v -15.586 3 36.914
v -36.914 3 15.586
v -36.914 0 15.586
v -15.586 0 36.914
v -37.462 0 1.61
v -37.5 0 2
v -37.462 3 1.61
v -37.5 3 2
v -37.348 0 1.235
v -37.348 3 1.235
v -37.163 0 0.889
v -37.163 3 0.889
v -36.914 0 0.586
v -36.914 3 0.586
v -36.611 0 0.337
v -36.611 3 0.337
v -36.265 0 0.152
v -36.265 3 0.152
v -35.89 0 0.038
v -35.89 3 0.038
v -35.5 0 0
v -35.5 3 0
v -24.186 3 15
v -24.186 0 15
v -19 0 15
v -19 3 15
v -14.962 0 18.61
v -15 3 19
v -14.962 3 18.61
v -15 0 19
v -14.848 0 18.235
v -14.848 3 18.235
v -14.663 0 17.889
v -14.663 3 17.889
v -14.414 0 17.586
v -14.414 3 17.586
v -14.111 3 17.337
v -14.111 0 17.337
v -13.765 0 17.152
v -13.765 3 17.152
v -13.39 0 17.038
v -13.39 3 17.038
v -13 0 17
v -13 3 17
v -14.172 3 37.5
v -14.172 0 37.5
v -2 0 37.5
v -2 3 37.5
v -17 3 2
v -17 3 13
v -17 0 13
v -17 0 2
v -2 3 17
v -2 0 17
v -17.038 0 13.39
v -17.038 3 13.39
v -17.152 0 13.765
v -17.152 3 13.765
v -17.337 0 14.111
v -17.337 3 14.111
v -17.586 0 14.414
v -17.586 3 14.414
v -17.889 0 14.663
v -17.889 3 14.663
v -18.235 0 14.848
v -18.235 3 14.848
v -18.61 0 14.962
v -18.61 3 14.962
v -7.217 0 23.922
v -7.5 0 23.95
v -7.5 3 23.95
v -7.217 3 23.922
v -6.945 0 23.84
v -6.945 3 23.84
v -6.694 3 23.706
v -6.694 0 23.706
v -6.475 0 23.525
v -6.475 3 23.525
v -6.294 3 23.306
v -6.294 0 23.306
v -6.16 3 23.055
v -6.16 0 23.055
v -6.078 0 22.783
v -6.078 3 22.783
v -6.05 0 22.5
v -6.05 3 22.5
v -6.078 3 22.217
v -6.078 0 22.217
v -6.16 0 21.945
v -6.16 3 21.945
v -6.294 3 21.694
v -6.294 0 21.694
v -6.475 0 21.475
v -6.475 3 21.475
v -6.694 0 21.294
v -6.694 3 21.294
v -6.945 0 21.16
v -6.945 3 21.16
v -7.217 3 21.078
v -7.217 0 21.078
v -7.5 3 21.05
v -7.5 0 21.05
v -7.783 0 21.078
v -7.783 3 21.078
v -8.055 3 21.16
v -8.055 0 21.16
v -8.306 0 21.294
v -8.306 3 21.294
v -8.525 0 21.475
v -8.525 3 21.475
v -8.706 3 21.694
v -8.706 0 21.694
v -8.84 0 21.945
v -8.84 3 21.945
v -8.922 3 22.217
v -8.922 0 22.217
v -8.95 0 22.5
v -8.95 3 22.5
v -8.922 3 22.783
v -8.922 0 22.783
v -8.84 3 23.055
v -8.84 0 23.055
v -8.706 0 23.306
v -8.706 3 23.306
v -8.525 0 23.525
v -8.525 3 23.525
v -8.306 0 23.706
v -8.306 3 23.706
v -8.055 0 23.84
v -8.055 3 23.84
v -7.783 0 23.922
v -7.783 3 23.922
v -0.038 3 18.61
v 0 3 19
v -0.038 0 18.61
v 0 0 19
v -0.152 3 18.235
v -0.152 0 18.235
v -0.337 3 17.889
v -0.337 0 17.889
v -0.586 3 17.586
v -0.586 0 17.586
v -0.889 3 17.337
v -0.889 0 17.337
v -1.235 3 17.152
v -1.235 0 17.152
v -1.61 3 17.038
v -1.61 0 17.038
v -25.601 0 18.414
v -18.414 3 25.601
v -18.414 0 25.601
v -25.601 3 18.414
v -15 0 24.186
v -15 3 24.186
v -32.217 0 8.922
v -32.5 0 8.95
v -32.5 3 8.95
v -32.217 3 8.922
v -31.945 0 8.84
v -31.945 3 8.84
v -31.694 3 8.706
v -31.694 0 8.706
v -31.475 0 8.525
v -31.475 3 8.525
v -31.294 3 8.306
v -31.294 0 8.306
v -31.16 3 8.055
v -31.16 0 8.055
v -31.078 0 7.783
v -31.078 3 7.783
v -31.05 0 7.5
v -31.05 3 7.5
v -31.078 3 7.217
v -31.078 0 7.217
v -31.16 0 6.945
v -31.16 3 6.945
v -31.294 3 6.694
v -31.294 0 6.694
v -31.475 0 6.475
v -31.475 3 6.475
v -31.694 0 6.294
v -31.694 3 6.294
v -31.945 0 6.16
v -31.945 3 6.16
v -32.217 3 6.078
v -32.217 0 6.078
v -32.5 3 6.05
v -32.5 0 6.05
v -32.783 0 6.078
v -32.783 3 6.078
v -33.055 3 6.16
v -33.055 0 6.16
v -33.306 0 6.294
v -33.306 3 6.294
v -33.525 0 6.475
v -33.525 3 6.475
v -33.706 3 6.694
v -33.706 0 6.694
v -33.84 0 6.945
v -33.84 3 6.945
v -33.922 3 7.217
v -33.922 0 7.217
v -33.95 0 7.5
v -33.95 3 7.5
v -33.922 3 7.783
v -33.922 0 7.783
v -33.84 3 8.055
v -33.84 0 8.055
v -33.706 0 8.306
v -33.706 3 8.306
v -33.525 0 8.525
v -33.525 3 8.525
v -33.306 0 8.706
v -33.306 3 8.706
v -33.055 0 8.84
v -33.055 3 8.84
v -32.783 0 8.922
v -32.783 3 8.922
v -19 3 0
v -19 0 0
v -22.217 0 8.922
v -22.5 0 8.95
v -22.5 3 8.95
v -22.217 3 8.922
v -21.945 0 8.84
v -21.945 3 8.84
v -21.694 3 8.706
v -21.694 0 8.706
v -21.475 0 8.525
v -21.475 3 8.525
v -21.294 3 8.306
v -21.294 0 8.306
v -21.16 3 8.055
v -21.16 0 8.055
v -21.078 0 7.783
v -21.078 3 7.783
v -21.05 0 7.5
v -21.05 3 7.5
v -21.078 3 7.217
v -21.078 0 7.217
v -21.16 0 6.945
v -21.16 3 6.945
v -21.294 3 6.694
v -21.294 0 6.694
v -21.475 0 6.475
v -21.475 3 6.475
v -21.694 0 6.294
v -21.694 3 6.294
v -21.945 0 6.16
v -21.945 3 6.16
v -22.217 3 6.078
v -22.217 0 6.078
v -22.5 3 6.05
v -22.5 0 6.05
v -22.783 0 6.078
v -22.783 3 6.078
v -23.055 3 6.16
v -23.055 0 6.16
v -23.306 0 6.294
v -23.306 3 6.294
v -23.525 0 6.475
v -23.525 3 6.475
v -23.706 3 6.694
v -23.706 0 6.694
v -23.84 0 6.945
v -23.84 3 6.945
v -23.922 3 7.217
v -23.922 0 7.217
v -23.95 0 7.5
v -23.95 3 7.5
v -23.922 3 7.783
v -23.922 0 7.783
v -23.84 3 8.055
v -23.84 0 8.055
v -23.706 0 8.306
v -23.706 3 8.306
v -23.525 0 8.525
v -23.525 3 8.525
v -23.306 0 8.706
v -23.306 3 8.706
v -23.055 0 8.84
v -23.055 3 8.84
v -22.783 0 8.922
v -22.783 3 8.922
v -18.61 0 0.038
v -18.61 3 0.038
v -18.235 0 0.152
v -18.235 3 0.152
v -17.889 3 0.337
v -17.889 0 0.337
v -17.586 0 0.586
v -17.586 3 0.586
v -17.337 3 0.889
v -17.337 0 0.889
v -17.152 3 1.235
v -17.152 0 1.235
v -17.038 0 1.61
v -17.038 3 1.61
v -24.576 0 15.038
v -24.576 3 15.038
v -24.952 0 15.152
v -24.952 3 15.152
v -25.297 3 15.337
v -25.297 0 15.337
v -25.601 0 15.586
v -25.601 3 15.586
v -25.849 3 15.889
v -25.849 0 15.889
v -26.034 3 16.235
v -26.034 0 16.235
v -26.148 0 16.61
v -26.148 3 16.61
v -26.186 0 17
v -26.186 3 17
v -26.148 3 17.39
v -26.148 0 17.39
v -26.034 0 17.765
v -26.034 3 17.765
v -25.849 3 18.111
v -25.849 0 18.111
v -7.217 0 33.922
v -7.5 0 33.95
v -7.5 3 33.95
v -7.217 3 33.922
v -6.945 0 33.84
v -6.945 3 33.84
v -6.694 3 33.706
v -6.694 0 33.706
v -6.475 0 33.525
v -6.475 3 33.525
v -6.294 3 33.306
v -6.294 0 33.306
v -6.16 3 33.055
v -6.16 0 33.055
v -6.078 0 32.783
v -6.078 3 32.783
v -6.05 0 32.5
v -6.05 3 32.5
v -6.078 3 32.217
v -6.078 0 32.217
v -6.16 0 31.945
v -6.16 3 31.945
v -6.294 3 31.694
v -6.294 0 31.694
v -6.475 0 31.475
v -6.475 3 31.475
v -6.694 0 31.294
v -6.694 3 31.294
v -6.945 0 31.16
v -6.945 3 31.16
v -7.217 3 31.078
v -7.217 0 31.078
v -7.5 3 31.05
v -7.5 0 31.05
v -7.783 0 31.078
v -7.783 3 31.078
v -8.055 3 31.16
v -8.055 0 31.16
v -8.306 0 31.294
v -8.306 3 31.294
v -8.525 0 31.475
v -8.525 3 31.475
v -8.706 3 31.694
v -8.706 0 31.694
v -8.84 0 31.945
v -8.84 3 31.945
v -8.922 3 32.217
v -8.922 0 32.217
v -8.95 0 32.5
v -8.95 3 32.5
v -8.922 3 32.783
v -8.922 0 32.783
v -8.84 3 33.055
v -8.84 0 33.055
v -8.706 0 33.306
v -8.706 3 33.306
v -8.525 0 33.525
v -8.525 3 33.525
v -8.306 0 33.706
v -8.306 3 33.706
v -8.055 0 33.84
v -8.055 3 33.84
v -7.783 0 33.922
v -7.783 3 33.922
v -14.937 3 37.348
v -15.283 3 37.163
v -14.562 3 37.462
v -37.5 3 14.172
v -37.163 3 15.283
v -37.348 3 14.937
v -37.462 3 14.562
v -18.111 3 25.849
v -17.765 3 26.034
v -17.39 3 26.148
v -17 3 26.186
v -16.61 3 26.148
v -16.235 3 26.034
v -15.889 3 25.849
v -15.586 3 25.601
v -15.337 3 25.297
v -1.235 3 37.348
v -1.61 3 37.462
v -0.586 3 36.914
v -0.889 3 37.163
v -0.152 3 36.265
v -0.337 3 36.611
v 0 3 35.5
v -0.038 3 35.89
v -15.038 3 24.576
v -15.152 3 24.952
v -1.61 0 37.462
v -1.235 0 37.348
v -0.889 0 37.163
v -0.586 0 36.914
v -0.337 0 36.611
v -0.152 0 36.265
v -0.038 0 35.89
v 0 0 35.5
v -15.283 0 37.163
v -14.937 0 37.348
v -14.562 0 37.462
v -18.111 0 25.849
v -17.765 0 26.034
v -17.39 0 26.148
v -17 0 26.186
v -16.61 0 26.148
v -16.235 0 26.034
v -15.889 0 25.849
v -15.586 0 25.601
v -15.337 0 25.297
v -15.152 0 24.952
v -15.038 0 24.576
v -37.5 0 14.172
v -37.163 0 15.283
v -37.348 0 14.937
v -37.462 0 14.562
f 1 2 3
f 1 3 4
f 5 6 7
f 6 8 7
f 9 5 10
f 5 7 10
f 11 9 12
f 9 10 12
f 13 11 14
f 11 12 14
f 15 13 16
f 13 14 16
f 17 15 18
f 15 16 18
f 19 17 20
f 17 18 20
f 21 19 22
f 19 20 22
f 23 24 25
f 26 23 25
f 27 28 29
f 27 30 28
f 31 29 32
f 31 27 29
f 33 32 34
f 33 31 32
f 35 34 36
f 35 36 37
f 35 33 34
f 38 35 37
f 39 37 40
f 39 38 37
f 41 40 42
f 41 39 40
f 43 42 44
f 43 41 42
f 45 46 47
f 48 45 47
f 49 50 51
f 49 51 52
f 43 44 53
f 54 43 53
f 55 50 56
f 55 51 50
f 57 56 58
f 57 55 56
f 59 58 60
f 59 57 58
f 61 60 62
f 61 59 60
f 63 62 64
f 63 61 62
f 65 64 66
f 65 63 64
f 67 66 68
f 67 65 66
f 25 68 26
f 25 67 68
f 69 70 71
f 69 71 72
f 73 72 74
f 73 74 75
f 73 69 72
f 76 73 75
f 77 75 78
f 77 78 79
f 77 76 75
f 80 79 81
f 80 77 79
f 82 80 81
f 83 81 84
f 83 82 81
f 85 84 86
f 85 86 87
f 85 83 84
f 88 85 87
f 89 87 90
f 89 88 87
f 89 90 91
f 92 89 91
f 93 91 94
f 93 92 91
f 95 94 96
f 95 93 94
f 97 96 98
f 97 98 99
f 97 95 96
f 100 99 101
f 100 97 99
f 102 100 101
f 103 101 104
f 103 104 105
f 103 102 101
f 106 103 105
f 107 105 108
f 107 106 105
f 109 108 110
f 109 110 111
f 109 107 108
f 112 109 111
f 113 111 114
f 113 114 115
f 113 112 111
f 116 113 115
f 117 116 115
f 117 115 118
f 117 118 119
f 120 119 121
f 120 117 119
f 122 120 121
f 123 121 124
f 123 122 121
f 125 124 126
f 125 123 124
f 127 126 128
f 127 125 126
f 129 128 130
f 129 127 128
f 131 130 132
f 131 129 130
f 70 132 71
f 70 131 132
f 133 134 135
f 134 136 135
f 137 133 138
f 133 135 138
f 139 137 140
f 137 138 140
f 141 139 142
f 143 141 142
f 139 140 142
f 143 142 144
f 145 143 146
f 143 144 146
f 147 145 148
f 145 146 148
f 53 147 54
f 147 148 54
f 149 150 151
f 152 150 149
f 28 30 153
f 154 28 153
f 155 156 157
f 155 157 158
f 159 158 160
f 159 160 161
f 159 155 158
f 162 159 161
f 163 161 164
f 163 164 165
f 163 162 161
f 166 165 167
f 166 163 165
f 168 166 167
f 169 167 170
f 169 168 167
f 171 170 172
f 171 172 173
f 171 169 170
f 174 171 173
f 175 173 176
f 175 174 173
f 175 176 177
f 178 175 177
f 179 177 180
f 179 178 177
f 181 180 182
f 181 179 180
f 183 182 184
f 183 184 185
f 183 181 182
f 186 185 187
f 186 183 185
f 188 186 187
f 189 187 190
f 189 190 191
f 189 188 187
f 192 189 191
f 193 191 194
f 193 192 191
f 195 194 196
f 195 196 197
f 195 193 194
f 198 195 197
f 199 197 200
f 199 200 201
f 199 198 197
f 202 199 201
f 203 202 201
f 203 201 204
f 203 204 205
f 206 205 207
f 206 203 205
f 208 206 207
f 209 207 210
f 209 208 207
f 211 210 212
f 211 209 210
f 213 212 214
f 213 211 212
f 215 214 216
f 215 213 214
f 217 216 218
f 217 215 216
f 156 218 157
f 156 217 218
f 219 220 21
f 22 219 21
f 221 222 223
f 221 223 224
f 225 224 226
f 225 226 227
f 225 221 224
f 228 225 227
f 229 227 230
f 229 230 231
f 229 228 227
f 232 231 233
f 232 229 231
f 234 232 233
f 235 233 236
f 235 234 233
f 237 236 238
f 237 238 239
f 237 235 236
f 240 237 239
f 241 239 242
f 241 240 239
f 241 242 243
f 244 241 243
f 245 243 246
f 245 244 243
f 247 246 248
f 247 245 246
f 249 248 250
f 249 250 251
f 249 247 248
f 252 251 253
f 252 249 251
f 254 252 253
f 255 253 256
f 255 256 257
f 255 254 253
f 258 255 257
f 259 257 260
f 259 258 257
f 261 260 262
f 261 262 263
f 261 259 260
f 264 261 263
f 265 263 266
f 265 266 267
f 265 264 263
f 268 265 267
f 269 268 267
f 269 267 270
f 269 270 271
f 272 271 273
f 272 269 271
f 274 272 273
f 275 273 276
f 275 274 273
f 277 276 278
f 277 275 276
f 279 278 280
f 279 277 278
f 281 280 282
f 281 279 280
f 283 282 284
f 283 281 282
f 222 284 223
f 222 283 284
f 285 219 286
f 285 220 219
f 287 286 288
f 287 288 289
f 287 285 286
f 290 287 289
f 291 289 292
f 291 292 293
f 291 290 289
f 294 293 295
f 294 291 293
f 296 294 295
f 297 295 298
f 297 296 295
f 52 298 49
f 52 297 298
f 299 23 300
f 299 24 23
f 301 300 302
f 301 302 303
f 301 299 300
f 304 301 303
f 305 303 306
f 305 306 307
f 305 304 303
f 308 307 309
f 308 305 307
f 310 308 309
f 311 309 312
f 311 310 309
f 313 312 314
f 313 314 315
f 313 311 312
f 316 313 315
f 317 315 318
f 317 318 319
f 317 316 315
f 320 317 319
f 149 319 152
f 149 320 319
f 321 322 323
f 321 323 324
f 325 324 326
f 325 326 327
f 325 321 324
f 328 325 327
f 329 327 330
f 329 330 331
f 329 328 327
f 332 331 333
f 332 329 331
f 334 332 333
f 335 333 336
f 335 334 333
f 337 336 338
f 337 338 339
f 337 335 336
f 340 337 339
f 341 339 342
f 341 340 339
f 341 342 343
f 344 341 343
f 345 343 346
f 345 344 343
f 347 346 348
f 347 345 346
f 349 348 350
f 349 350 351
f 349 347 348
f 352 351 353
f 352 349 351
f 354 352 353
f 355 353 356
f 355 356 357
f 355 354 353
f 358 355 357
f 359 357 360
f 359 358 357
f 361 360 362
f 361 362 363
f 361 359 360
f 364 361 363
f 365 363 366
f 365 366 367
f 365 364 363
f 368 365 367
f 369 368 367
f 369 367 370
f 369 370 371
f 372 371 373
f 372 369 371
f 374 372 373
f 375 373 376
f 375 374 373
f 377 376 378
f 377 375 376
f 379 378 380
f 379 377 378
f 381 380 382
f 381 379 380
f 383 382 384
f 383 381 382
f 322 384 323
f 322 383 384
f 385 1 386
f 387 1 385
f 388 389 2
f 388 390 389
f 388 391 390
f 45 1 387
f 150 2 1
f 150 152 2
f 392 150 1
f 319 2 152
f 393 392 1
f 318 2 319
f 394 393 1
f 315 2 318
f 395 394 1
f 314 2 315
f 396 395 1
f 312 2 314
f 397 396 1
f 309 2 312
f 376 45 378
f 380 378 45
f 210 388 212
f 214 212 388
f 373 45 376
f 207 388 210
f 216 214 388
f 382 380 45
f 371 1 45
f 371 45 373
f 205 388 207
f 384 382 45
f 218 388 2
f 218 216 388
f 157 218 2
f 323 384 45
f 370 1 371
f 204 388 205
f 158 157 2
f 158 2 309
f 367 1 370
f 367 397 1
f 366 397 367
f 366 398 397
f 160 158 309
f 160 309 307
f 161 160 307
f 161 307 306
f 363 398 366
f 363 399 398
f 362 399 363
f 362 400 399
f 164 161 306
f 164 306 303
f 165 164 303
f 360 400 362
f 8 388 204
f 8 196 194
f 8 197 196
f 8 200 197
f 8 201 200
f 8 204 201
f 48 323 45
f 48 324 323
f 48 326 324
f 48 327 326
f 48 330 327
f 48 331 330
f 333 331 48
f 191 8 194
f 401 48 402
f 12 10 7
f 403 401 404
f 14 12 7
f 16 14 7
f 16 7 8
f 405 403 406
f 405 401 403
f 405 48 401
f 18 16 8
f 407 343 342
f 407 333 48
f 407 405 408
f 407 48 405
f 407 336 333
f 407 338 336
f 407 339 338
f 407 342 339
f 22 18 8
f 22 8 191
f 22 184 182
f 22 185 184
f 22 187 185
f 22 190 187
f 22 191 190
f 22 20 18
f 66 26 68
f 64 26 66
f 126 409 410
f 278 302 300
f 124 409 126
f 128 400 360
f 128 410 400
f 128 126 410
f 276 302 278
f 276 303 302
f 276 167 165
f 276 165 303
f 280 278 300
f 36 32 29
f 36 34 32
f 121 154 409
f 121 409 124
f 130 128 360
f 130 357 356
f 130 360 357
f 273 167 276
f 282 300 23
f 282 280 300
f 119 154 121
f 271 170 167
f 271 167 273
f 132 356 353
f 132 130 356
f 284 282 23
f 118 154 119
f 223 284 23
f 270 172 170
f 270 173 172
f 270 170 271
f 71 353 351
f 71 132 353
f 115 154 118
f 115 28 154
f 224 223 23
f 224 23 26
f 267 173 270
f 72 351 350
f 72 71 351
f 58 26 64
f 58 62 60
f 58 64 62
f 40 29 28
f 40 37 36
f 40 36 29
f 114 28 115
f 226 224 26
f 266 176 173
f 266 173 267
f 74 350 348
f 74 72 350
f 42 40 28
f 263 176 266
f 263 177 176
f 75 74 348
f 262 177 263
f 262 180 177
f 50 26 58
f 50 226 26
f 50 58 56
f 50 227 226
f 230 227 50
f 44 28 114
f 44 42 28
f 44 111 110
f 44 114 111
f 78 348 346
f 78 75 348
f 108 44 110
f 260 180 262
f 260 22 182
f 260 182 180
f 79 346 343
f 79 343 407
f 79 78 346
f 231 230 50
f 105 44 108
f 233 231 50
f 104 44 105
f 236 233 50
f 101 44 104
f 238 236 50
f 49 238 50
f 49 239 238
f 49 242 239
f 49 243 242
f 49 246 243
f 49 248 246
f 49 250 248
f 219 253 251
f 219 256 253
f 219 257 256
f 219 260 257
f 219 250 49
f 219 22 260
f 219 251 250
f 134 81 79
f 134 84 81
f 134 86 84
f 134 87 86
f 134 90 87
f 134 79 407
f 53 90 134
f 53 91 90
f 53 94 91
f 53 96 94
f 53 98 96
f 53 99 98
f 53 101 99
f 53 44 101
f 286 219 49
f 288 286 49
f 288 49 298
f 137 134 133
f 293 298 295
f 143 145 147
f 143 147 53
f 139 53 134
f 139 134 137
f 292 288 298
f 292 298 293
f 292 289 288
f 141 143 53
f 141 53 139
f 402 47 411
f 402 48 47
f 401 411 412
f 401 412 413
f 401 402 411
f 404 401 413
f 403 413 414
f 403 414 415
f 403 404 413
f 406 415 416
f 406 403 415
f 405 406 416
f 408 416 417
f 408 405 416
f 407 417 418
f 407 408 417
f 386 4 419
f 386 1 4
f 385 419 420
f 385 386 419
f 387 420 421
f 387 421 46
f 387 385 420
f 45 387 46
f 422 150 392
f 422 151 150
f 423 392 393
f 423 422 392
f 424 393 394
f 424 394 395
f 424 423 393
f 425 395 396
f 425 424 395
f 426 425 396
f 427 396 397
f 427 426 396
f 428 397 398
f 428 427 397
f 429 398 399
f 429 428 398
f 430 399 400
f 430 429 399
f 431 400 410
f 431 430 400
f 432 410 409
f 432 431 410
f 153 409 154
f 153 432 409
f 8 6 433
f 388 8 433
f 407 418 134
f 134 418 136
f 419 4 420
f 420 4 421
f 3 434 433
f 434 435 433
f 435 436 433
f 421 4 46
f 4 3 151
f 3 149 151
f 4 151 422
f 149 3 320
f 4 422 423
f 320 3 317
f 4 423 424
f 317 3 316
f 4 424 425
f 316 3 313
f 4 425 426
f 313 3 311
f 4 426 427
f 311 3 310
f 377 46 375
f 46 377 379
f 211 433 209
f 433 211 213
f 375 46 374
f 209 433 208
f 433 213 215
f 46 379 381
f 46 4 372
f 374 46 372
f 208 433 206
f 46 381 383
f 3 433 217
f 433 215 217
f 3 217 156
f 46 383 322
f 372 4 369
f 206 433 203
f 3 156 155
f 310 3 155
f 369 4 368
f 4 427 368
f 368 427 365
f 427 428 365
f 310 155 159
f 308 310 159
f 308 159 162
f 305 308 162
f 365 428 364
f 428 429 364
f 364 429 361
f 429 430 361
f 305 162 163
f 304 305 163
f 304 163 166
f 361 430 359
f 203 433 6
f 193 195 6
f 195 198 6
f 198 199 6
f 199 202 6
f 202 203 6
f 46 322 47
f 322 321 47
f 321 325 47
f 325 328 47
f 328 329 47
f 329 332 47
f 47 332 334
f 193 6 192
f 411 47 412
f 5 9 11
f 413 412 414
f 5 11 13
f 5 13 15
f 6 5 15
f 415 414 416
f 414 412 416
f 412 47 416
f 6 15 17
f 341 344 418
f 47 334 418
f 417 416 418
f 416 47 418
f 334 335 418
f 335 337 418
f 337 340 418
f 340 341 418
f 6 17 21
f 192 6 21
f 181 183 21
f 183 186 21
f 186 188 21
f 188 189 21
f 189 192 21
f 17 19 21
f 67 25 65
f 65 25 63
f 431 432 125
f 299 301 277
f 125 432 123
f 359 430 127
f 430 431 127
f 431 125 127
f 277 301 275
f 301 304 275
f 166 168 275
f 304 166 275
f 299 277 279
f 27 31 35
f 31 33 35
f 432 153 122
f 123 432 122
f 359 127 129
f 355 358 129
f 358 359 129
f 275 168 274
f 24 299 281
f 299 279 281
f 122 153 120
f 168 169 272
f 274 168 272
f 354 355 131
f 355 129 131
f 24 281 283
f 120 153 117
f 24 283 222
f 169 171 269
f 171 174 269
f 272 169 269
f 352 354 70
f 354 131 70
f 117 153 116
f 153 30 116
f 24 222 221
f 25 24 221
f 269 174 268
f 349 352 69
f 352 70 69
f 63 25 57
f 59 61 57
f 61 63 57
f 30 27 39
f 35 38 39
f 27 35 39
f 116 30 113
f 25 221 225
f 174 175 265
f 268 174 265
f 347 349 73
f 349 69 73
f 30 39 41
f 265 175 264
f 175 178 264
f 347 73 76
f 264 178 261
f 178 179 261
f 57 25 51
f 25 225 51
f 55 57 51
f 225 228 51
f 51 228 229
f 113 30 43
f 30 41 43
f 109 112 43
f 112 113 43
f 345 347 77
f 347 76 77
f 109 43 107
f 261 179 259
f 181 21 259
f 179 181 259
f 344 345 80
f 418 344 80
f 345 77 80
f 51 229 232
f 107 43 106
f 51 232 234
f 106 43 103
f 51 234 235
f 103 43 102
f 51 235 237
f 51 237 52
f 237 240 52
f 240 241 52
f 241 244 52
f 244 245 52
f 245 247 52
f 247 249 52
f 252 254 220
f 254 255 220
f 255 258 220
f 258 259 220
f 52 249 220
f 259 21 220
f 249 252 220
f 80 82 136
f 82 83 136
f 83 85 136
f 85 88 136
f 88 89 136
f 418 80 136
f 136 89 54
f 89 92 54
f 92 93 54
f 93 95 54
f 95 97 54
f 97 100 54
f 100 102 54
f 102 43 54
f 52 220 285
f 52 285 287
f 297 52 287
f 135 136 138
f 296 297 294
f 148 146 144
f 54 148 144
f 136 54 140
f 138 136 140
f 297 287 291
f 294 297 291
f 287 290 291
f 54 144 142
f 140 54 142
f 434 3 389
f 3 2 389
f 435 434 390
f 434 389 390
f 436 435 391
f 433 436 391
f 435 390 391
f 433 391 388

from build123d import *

# Parameters (mm, degrees)
SKETCH_1_R          = 1.45
EXTRUDE_1_DEPTH     = 3
EXTRUDE_2_DEPTH     = 3
SKETCH_3_W          = 17
SKETCH_3_H          = 17
CUT_EXTRUDE_1_DEPTH = 54.117793629
FILLET_1_R          = 2


with BuildPart() as part:
    # 草图1 → 凸台-拉伸1 (new body)
    with BuildSketch(Plane(origin=(0, 0, 0), x_dir=(1, 0, 0), z_dir=(0, 1, 0))):
        Polygon((0, 0), (-37.5, 0), (-37.5, -15), (-15, -15), (-15, -37.5), (0, -37.5), align=None)
        with Locations(Location((-7.5, -7.5, 0), (0, 0, 270))):
            Circle(SKETCH_1_R, mode=Mode.SUBTRACT)
        with Locations(Location((-22.5, -7.5, 0), (0, 0, 270))):
            Circle(SKETCH_1_R, mode=Mode.SUBTRACT)
        with Locations(Location((-32.5, -7.5, 0), (0, 0, 270))):
            Circle(SKETCH_1_R, mode=Mode.SUBTRACT)
        with Locations(Location((-7.5, -22.5, 0), (0, 0, 270))):
            Circle(SKETCH_1_R, mode=Mode.SUBTRACT)
        with Locations(Location((-7.5, -32.5, 0), (0, 0, 270))):
            Circle(SKETCH_1_R, mode=Mode.SUBTRACT)
    extrude(amount=EXTRUDE_1_DEPTH)

    # 草图2 → 凸台-拉伸2 (add)
    with BuildSketch(Plane(origin=(0, 3, 0), x_dir=(1, 0, 0), z_dir=(0, 1, 0))):
        Polygon((-37.5, -15), (-15, -37.5), (-15, -29.014718626), (-29.014718626, -15), align=None)
    extrude(amount=-EXTRUDE_2_DEPTH)

    # 草图3 → 切除-拉伸1 (cut, through all)
    with BuildSketch(Plane(origin=(0, 3, 0), x_dir=(1, 0, 0), z_dir=(0, 1, 0))):
        with Locations((-8.5, -8.5)):
            Rectangle(SKETCH_3_W, SKETCH_3_H)
    extrude(amount=-CUT_EXTRUDE_1_DEPTH, mode=Mode.SUBTRACT)

    # 圆角1
    fillet_1_edges = [part.edges().sort_by_distance(p)[0] for p in [
        (0, 1.5, 37.5),
        (-15, 1.5, 37.5),
        (-37.5, 1.5, 15),
        (-37.5, 1.5, 0),
        (-29.014718626, 1.5, 15),
        (-15, 1.5, 29.014718626),
        (-15, 1.5, 17),
        (-17, 1.5, 15),
        (0, 1.5, 17),
        (-17, 1.5, 0),
    ]]
    fillet(fillet_1_edges, radius=FILLET_1_R)


solid = part.part
